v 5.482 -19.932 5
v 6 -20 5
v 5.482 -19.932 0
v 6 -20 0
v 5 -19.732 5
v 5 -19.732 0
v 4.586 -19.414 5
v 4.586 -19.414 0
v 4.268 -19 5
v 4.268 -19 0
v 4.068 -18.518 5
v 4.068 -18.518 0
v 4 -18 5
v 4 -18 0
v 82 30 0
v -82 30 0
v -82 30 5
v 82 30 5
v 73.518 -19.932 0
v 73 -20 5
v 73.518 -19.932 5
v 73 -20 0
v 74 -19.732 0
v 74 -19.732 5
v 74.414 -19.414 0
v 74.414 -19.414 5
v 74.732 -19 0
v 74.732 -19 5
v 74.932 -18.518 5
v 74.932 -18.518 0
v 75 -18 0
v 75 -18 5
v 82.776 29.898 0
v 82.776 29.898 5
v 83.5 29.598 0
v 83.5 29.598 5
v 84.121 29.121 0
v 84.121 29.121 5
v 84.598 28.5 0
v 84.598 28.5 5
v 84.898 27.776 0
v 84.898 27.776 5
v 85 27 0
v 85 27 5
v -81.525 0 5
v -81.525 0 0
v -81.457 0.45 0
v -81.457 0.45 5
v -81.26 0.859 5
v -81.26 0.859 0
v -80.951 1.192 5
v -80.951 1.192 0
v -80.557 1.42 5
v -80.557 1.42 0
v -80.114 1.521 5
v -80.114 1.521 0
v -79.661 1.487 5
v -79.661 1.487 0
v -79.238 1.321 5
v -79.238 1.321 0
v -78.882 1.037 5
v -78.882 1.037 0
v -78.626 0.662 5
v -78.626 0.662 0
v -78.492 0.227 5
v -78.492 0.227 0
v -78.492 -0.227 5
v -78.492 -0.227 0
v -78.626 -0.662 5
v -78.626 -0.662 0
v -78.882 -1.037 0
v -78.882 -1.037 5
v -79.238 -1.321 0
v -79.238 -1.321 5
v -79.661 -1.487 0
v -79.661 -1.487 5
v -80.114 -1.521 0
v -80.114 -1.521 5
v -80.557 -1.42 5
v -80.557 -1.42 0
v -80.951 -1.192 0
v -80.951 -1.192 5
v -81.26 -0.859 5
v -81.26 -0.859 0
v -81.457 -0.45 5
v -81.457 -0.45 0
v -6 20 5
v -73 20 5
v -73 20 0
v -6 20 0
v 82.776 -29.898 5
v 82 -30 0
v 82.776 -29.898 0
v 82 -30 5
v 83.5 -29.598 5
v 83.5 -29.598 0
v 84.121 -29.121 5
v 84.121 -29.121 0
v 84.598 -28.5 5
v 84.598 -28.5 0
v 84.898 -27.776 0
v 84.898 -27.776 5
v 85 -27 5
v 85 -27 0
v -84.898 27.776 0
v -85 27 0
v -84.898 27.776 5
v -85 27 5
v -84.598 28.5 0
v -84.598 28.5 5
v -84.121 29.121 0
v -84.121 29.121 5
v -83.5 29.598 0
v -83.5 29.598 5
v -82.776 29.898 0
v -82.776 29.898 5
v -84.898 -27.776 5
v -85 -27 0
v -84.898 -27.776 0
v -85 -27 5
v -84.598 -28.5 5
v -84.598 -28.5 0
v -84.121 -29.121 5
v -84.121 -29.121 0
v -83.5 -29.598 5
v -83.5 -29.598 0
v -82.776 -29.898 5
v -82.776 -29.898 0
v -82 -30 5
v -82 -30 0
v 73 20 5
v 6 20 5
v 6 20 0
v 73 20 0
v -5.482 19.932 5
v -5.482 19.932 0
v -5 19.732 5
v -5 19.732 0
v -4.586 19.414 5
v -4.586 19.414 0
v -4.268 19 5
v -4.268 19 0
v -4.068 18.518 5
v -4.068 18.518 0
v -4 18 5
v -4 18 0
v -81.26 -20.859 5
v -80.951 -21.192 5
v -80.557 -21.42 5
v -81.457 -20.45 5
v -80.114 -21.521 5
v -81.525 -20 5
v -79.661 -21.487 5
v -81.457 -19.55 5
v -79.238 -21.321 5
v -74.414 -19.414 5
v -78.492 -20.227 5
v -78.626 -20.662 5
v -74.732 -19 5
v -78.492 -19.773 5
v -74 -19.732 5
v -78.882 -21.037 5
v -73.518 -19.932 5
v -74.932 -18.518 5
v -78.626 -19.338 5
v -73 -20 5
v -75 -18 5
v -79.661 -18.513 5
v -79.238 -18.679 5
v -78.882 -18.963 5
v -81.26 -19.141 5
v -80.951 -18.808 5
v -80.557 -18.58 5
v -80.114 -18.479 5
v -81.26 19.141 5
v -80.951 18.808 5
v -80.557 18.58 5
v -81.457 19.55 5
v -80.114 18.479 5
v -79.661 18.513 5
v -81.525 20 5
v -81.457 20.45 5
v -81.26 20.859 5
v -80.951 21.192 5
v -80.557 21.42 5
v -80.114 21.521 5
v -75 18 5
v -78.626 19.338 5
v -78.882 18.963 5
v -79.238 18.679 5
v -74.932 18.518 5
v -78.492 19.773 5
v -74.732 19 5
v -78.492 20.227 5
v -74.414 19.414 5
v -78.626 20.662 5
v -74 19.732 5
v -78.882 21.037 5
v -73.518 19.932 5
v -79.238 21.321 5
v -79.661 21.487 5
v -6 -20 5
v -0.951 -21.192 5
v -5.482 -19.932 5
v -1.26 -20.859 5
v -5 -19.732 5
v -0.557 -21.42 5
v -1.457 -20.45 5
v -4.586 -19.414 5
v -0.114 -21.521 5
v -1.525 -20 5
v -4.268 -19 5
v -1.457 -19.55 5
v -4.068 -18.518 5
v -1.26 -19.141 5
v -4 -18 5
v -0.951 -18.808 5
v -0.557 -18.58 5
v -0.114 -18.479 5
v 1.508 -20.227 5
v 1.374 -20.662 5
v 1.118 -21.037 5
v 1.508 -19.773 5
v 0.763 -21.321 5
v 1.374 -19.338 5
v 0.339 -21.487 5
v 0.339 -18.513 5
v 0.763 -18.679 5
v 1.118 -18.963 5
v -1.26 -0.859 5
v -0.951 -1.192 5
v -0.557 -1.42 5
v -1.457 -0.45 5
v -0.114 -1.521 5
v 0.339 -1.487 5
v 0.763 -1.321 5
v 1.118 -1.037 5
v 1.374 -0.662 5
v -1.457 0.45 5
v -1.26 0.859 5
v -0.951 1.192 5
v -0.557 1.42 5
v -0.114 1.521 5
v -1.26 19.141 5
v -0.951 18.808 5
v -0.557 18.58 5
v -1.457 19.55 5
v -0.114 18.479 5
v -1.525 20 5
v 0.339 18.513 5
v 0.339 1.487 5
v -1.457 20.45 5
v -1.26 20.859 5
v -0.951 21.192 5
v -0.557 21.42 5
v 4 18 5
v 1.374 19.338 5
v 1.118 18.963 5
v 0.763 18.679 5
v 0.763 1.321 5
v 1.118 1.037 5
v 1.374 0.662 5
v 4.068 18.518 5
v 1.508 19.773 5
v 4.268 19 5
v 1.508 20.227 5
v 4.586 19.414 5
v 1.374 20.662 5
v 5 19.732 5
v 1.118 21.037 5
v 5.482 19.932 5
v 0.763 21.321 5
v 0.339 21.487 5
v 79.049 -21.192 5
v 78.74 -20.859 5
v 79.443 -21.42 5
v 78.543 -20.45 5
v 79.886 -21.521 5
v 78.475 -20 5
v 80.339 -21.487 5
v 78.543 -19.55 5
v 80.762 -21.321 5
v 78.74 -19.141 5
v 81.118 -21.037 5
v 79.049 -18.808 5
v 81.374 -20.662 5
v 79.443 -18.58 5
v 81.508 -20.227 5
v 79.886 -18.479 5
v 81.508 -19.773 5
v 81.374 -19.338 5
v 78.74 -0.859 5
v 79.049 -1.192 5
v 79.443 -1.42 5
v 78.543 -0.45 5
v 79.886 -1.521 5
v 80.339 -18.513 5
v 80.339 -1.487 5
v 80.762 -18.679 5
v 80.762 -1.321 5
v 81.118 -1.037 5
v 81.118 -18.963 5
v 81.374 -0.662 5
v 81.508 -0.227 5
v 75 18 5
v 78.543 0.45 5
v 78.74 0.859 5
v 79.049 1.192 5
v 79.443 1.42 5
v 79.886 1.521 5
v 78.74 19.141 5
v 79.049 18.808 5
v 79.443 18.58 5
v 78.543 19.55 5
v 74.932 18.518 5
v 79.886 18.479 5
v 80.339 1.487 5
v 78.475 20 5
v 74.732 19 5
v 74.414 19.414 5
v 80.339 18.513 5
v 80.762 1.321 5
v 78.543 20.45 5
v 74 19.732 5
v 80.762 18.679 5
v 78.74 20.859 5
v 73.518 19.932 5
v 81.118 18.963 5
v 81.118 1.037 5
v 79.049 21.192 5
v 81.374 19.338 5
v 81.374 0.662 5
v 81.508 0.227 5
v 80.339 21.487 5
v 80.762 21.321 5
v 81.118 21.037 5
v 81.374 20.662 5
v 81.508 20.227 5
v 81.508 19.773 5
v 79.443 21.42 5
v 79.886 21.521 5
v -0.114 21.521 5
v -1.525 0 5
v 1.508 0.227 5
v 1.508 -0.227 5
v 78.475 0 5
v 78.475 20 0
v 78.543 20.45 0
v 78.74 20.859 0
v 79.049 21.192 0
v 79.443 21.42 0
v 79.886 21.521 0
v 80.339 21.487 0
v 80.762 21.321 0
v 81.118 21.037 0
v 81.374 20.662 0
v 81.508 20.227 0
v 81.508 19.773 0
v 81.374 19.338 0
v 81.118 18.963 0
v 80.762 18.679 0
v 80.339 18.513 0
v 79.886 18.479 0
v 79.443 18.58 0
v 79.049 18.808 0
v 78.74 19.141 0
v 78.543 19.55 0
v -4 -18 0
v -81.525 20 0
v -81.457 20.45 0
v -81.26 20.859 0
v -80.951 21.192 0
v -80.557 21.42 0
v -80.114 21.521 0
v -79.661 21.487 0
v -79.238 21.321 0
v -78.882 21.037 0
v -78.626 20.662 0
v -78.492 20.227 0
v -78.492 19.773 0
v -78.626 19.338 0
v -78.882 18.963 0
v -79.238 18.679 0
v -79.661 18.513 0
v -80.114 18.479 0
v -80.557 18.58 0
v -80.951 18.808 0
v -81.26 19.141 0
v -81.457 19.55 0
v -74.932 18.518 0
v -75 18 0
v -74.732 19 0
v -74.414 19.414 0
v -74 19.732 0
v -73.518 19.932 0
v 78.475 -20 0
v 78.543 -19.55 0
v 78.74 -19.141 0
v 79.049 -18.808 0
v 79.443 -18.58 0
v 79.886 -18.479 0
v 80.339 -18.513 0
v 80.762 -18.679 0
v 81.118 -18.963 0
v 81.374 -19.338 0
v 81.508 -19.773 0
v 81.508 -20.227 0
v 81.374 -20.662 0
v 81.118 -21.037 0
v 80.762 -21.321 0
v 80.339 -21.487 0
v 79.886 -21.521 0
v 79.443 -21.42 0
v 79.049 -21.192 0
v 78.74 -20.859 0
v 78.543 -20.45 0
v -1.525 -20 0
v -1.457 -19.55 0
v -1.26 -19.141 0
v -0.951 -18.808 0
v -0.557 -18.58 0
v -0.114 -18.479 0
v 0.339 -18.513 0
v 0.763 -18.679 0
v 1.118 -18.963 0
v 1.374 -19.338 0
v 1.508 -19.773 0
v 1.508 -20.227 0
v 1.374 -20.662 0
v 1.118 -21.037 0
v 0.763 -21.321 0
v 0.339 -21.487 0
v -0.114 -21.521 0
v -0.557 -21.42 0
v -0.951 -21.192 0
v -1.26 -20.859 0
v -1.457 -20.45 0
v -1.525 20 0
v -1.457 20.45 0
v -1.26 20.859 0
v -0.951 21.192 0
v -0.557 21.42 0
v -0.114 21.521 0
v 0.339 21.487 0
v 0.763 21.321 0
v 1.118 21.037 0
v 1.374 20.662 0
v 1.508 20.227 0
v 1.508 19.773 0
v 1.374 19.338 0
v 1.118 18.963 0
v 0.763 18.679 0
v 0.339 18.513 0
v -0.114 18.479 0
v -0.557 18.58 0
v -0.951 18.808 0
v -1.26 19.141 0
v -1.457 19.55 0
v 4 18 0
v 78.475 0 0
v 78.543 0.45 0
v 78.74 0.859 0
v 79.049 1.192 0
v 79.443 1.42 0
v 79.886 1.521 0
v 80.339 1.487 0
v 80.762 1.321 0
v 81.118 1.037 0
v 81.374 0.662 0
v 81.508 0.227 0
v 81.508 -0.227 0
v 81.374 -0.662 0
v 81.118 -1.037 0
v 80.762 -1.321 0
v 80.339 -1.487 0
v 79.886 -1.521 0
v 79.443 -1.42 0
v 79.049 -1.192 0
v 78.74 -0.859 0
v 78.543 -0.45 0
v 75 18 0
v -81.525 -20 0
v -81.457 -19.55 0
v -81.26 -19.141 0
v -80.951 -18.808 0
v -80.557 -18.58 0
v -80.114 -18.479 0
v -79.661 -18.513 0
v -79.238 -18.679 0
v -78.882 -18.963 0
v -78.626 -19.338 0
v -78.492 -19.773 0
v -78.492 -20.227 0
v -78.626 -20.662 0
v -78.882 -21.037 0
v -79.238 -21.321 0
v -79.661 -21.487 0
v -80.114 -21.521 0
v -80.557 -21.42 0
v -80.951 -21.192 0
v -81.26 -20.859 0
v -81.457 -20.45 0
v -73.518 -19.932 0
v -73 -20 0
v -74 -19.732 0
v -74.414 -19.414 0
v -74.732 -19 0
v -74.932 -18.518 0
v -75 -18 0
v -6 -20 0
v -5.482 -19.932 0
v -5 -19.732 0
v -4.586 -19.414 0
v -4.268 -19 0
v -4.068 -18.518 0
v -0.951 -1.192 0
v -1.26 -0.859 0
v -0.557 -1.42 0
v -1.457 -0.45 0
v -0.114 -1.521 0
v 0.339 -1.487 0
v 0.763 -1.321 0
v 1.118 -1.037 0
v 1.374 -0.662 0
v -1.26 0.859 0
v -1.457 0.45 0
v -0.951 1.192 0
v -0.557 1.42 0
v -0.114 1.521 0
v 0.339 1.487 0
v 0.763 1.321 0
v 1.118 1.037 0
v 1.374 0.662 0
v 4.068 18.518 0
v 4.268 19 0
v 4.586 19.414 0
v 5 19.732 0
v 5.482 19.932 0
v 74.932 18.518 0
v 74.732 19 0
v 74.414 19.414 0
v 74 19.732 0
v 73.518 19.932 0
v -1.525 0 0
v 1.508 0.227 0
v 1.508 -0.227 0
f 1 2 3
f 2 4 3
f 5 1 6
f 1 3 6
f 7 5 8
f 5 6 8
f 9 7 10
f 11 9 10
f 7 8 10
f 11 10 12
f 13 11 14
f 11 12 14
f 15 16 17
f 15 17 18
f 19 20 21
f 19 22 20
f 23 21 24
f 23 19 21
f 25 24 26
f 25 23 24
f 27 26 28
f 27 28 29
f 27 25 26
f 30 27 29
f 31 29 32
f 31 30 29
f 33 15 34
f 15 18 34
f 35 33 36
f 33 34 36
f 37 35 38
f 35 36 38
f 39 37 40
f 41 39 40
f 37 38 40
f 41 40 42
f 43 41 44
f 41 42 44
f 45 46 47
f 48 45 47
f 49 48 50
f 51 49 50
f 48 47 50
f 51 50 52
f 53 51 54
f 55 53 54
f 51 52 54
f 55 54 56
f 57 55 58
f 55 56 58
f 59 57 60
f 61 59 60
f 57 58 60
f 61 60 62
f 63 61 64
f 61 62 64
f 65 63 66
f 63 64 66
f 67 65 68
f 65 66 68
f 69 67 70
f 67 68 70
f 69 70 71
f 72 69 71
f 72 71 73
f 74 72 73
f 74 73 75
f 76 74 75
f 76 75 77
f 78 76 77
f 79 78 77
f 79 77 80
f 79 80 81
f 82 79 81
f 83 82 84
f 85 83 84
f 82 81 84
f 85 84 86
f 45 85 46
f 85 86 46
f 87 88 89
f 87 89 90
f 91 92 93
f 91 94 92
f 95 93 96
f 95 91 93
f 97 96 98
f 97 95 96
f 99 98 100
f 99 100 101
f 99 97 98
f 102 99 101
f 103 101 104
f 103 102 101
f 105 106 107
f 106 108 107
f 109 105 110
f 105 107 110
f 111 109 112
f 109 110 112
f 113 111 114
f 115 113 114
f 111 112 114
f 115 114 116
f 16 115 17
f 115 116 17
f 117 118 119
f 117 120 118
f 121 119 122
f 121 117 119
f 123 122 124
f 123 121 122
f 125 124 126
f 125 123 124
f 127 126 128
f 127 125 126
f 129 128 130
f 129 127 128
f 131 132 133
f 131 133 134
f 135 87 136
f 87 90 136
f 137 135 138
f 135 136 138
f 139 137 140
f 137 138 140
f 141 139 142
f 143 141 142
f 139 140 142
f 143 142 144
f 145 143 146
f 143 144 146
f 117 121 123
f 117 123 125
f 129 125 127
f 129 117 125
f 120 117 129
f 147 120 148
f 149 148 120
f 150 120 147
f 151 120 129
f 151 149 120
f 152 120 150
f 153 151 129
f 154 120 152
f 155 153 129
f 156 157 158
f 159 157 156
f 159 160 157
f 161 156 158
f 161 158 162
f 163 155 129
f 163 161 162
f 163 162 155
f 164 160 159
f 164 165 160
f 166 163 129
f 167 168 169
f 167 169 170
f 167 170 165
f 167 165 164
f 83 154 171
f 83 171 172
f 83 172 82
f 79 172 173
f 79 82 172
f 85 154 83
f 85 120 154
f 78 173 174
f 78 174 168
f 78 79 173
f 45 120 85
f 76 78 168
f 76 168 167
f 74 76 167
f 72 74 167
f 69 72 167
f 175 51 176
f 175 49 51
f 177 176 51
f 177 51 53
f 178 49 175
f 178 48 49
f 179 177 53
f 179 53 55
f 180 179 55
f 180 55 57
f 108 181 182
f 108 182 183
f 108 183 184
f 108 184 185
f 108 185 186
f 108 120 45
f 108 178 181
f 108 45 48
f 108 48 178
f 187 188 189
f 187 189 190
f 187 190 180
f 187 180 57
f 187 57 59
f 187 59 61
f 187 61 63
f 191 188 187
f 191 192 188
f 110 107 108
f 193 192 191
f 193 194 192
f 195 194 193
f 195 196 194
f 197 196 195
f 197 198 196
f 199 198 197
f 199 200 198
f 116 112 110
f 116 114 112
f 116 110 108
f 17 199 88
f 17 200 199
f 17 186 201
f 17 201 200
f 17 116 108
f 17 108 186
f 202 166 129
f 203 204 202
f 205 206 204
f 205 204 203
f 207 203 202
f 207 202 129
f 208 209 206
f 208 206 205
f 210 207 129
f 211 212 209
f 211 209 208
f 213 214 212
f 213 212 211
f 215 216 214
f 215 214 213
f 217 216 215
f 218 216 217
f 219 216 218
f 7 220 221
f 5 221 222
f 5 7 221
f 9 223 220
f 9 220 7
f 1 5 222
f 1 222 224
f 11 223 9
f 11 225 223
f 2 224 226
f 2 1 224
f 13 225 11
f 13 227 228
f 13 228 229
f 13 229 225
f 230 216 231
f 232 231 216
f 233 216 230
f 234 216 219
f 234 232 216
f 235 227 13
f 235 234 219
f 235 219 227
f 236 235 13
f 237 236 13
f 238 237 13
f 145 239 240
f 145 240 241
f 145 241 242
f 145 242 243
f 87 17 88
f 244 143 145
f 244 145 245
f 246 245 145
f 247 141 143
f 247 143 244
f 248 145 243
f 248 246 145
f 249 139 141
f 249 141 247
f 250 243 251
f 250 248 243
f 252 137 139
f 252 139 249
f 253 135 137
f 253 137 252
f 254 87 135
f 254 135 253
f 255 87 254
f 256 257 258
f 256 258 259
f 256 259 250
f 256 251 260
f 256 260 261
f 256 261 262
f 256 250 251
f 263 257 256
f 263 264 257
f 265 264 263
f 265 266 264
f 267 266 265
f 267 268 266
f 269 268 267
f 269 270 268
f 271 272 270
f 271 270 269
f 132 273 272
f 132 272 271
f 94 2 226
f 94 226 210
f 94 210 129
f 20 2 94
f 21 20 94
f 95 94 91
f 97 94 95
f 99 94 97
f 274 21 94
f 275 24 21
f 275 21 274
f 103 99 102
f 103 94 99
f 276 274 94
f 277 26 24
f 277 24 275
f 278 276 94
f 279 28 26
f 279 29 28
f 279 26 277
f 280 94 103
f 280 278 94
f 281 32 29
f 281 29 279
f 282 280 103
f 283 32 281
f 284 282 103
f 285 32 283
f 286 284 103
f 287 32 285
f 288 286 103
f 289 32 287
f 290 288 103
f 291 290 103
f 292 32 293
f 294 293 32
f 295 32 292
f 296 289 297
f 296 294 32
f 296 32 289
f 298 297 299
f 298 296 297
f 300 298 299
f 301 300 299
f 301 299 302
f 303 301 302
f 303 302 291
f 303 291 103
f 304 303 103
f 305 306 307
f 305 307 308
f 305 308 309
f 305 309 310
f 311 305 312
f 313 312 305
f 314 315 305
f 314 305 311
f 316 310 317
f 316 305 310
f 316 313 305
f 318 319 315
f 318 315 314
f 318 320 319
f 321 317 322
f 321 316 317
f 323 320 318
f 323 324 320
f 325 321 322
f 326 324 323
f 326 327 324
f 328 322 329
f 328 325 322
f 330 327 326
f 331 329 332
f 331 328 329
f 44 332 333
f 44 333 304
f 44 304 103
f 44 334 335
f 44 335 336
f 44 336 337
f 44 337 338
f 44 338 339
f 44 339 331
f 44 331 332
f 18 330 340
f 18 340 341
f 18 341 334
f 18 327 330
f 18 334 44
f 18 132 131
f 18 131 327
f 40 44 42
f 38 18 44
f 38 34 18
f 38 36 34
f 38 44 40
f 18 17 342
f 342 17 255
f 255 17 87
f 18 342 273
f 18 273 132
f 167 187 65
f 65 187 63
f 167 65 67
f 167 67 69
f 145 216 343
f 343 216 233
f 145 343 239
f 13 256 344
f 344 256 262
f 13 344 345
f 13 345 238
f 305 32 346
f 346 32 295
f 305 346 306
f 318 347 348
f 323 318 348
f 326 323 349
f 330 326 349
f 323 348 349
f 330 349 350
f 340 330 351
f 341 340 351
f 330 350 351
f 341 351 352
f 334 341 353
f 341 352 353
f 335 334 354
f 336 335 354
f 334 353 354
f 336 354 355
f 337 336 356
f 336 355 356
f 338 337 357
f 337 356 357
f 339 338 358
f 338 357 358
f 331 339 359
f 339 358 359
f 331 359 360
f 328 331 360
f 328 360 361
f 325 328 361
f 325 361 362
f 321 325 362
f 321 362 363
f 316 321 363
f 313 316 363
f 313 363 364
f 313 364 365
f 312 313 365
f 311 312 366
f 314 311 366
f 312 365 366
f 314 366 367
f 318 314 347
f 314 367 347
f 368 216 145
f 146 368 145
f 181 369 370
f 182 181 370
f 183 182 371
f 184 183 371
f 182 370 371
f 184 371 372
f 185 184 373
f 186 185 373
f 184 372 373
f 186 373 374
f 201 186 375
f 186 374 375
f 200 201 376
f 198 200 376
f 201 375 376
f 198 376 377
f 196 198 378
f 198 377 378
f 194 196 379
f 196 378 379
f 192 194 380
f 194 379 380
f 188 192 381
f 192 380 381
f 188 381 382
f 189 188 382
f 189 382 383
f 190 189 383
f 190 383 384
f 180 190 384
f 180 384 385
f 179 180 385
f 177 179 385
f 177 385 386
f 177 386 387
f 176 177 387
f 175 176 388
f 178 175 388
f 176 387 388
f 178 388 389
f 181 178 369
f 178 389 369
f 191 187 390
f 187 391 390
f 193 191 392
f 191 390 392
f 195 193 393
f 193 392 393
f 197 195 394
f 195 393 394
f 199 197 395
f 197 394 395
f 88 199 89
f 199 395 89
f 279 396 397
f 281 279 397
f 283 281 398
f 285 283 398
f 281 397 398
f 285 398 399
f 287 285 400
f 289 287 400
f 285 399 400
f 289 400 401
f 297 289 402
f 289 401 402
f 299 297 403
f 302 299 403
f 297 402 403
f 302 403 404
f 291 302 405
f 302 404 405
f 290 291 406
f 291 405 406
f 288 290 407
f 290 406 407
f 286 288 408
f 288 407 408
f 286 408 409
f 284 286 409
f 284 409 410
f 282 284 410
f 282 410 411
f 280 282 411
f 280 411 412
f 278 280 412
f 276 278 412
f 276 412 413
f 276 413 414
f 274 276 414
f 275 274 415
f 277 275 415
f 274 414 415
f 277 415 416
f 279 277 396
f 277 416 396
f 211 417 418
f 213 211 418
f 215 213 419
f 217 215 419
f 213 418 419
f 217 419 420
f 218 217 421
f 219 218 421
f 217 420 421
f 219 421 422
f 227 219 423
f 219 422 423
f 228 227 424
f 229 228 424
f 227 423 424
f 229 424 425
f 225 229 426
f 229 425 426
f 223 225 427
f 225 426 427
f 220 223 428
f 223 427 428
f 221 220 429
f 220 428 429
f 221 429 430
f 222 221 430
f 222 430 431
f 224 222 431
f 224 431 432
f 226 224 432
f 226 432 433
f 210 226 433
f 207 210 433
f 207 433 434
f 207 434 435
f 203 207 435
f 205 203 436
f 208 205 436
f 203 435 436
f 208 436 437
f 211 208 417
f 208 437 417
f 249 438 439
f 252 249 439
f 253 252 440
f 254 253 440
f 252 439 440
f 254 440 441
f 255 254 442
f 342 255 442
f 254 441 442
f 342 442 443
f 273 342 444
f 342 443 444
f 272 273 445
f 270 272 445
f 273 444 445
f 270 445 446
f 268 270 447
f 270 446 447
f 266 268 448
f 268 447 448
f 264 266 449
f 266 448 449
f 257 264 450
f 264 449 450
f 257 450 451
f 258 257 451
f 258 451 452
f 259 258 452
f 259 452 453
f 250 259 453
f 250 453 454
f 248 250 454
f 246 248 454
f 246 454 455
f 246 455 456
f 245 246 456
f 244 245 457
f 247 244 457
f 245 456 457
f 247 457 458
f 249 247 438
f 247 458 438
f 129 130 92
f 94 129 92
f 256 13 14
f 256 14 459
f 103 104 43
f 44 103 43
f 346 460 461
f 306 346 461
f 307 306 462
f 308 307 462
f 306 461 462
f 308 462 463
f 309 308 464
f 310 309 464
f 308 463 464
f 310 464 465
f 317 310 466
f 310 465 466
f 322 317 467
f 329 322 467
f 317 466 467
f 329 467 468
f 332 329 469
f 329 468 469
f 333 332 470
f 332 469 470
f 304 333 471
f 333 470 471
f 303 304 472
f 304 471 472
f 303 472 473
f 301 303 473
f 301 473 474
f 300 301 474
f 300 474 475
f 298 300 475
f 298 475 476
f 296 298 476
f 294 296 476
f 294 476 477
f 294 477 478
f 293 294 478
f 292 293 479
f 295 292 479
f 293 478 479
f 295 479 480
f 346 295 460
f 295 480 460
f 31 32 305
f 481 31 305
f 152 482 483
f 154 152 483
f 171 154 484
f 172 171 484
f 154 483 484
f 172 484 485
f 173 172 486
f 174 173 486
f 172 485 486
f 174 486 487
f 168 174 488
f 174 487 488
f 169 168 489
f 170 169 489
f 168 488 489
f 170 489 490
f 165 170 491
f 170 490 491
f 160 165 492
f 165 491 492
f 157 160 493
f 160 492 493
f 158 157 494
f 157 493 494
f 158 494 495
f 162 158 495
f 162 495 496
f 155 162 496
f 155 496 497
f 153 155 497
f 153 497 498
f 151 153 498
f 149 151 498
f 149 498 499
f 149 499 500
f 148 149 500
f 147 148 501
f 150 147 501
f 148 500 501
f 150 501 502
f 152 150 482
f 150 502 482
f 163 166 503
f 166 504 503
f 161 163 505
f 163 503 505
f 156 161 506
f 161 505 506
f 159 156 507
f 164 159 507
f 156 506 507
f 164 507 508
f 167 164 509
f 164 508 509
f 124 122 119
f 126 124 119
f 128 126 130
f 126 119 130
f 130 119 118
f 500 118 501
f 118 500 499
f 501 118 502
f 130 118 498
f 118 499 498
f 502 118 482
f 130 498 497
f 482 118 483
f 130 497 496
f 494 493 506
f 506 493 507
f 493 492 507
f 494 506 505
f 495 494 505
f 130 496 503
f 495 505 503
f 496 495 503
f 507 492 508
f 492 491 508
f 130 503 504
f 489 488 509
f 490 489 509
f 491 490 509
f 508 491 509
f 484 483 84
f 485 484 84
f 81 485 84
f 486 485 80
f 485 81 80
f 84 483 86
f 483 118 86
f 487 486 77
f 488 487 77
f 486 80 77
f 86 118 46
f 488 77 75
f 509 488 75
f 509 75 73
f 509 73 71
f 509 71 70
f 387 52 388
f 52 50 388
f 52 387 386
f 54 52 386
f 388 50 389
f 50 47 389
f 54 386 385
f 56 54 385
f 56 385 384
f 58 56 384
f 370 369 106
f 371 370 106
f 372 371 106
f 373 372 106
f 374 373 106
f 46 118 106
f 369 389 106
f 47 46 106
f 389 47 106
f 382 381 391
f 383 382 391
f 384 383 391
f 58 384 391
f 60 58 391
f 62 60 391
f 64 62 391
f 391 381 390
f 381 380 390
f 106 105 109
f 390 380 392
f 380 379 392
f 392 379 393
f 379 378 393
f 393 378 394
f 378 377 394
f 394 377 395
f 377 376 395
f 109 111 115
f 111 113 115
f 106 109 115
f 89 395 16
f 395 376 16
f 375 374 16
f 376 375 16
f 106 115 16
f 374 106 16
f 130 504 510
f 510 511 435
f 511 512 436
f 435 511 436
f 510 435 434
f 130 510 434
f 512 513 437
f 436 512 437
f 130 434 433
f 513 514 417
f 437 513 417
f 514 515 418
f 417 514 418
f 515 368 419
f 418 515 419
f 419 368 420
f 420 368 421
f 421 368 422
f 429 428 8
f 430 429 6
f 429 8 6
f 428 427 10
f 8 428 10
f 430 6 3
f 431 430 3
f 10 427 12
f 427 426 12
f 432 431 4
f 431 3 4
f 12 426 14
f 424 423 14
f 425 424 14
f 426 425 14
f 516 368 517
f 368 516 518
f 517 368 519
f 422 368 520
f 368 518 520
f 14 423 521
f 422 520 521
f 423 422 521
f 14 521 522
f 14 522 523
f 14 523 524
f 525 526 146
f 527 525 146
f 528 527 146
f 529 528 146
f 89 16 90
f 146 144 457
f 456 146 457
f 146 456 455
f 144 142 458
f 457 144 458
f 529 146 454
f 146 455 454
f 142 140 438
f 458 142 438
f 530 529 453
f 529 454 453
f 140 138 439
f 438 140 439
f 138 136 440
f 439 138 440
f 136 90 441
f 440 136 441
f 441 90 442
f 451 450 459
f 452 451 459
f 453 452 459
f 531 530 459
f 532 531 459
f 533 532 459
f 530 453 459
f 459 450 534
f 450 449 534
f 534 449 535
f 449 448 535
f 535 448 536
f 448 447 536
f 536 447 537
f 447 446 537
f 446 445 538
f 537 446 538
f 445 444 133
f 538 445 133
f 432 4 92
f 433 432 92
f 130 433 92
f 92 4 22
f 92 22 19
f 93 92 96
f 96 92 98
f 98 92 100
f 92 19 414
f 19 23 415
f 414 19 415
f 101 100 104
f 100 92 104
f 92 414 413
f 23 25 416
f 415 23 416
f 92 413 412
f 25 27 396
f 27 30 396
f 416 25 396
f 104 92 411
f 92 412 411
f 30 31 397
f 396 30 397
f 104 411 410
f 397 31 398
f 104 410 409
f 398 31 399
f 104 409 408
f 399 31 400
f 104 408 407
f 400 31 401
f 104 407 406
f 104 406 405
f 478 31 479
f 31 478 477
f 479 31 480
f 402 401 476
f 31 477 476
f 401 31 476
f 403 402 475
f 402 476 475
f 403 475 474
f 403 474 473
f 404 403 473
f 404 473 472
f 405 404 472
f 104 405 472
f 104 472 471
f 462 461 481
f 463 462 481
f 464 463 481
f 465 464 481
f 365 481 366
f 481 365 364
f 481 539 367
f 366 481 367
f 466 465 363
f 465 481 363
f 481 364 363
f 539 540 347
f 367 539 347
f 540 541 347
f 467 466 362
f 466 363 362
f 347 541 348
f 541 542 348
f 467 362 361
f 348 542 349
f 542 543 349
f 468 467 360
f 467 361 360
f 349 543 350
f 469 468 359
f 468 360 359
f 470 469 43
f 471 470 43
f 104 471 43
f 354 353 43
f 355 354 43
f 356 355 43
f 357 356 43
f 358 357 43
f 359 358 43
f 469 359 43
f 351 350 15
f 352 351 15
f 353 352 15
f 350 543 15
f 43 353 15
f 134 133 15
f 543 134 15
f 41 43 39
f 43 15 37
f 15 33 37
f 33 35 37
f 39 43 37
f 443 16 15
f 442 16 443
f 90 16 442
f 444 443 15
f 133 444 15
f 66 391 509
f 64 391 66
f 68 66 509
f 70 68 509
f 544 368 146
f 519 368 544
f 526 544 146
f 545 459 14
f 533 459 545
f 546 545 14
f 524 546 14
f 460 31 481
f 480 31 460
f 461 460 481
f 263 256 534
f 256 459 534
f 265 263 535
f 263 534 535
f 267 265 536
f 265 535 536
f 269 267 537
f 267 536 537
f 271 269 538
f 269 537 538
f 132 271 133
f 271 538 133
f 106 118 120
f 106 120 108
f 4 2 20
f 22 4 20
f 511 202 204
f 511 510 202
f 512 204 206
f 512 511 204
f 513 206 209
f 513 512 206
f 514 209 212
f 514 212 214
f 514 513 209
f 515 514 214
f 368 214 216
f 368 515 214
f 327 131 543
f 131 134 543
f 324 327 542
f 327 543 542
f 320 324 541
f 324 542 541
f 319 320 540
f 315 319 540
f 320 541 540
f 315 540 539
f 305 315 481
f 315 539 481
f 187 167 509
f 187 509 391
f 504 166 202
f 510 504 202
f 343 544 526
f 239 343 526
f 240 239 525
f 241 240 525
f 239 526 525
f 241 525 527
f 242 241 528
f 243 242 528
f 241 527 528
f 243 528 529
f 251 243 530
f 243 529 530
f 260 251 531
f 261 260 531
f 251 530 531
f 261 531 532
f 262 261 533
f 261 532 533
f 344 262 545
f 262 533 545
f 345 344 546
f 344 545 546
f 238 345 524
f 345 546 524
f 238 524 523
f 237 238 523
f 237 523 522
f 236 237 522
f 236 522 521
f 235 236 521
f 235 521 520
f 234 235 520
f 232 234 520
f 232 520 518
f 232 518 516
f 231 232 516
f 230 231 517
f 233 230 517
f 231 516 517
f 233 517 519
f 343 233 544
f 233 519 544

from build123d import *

# Parameters (mm, degrees)
SKETCH_1_W          = 170
SKETCH_1_H          = 60
EXTRUDE_1_DEPTH     = 5
SKETCH_2_W          = 150
SKETCH_2_H          = 40
CUT_EXTRUDE_1_DEPTH = 5
SKETCH_3_W          = 8
SKETCH_3_H          = 40
EXTRUDE_2_DEPTH     = 5
FILLET_1_R          = 3
FILLET_2_R          = 2
SKETCH_4_R          = 1.525
CUT_EXTRUDE_2_DEPTH = 5


with BuildPart() as part:
    # 草图1 → 凸台-拉伸1 (new body)
    with BuildSketch(Plane.XY):
        Rectangle(SKETCH_1_W, SKETCH_1_H)
    extrude(amount=EXTRUDE_1_DEPTH)

    # 草图2 → 切除-拉伸1 (cut)
    with BuildSketch(Plane.XY.offset(5)):
        Rectangle(SKETCH_2_W, SKETCH_2_H)
    extrude(amount=-CUT_EXTRUDE_1_DEPTH, mode=Mode.SUBTRACT)

    # 草图3 → 凸台-拉伸2 (add)
    with BuildSketch(Plane.XY.offset(5)):
        Rectangle(SKETCH_3_W, SKETCH_3_H)
    extrude(amount=-EXTRUDE_2_DEPTH)

    # 圆角1
    fillet_1_edges = [part.edges().sort_by_distance(p)[0] for p in [
        (85, -30, 2.5),
        (-85, -30, 2.5),
        (-85, 30, 2.5),
        (85, 30, 2.5),
    ]]
    fillet(fillet_1_edges, radius=FILLET_1_R)

    # 圆角2
    fillet_2_edges = [part.edges().sort_by_distance(p)[0] for p in [
        (75, 20, 2.5),
        (75, -20, 2.5),
        (-75, -20, 2.5),
        (-75, 20, 2.5),
        (-4, 20, 2.5),
        (-4, -20, 2.5),
        (4, -20, 2.5),
        (4, 20, 2.5),
    ]]
    fillet(fillet_2_edges, radius=FILLET_2_R)

    # 草图4 → 切除-拉伸2 (cut)
    with BuildSketch(Plane(origin=(0, 0, 0), x_dir=(-1, 0, 0), z_dir=(0, 0, -1))):
        with Locations((80, 20)):
            Circle(SKETCH_4_R)
        with Locations((80, 0)):
            Circle(SKETCH_4_R)
        with Locations((0, -20)):
            Circle(SKETCH_4_R)
        with Locations((0, 20)):
            Circle(SKETCH_4_R)
        with Locations((-80, 20)):
            Circle(SKETCH_4_R)
        with Locations((-80, 0)):
            Circle(SKETCH_4_R)
        with Locations((-80, -20)):
            Circle(SKETCH_4_R)
        Circle(SKETCH_4_R)
        with Locations((80, -20)):
            Circle(SKETCH_4_R)
    extrude(amount=-CUT_EXTRUDE_2_DEPTH, mode=Mode.SUBTRACT)


solid = part.part
